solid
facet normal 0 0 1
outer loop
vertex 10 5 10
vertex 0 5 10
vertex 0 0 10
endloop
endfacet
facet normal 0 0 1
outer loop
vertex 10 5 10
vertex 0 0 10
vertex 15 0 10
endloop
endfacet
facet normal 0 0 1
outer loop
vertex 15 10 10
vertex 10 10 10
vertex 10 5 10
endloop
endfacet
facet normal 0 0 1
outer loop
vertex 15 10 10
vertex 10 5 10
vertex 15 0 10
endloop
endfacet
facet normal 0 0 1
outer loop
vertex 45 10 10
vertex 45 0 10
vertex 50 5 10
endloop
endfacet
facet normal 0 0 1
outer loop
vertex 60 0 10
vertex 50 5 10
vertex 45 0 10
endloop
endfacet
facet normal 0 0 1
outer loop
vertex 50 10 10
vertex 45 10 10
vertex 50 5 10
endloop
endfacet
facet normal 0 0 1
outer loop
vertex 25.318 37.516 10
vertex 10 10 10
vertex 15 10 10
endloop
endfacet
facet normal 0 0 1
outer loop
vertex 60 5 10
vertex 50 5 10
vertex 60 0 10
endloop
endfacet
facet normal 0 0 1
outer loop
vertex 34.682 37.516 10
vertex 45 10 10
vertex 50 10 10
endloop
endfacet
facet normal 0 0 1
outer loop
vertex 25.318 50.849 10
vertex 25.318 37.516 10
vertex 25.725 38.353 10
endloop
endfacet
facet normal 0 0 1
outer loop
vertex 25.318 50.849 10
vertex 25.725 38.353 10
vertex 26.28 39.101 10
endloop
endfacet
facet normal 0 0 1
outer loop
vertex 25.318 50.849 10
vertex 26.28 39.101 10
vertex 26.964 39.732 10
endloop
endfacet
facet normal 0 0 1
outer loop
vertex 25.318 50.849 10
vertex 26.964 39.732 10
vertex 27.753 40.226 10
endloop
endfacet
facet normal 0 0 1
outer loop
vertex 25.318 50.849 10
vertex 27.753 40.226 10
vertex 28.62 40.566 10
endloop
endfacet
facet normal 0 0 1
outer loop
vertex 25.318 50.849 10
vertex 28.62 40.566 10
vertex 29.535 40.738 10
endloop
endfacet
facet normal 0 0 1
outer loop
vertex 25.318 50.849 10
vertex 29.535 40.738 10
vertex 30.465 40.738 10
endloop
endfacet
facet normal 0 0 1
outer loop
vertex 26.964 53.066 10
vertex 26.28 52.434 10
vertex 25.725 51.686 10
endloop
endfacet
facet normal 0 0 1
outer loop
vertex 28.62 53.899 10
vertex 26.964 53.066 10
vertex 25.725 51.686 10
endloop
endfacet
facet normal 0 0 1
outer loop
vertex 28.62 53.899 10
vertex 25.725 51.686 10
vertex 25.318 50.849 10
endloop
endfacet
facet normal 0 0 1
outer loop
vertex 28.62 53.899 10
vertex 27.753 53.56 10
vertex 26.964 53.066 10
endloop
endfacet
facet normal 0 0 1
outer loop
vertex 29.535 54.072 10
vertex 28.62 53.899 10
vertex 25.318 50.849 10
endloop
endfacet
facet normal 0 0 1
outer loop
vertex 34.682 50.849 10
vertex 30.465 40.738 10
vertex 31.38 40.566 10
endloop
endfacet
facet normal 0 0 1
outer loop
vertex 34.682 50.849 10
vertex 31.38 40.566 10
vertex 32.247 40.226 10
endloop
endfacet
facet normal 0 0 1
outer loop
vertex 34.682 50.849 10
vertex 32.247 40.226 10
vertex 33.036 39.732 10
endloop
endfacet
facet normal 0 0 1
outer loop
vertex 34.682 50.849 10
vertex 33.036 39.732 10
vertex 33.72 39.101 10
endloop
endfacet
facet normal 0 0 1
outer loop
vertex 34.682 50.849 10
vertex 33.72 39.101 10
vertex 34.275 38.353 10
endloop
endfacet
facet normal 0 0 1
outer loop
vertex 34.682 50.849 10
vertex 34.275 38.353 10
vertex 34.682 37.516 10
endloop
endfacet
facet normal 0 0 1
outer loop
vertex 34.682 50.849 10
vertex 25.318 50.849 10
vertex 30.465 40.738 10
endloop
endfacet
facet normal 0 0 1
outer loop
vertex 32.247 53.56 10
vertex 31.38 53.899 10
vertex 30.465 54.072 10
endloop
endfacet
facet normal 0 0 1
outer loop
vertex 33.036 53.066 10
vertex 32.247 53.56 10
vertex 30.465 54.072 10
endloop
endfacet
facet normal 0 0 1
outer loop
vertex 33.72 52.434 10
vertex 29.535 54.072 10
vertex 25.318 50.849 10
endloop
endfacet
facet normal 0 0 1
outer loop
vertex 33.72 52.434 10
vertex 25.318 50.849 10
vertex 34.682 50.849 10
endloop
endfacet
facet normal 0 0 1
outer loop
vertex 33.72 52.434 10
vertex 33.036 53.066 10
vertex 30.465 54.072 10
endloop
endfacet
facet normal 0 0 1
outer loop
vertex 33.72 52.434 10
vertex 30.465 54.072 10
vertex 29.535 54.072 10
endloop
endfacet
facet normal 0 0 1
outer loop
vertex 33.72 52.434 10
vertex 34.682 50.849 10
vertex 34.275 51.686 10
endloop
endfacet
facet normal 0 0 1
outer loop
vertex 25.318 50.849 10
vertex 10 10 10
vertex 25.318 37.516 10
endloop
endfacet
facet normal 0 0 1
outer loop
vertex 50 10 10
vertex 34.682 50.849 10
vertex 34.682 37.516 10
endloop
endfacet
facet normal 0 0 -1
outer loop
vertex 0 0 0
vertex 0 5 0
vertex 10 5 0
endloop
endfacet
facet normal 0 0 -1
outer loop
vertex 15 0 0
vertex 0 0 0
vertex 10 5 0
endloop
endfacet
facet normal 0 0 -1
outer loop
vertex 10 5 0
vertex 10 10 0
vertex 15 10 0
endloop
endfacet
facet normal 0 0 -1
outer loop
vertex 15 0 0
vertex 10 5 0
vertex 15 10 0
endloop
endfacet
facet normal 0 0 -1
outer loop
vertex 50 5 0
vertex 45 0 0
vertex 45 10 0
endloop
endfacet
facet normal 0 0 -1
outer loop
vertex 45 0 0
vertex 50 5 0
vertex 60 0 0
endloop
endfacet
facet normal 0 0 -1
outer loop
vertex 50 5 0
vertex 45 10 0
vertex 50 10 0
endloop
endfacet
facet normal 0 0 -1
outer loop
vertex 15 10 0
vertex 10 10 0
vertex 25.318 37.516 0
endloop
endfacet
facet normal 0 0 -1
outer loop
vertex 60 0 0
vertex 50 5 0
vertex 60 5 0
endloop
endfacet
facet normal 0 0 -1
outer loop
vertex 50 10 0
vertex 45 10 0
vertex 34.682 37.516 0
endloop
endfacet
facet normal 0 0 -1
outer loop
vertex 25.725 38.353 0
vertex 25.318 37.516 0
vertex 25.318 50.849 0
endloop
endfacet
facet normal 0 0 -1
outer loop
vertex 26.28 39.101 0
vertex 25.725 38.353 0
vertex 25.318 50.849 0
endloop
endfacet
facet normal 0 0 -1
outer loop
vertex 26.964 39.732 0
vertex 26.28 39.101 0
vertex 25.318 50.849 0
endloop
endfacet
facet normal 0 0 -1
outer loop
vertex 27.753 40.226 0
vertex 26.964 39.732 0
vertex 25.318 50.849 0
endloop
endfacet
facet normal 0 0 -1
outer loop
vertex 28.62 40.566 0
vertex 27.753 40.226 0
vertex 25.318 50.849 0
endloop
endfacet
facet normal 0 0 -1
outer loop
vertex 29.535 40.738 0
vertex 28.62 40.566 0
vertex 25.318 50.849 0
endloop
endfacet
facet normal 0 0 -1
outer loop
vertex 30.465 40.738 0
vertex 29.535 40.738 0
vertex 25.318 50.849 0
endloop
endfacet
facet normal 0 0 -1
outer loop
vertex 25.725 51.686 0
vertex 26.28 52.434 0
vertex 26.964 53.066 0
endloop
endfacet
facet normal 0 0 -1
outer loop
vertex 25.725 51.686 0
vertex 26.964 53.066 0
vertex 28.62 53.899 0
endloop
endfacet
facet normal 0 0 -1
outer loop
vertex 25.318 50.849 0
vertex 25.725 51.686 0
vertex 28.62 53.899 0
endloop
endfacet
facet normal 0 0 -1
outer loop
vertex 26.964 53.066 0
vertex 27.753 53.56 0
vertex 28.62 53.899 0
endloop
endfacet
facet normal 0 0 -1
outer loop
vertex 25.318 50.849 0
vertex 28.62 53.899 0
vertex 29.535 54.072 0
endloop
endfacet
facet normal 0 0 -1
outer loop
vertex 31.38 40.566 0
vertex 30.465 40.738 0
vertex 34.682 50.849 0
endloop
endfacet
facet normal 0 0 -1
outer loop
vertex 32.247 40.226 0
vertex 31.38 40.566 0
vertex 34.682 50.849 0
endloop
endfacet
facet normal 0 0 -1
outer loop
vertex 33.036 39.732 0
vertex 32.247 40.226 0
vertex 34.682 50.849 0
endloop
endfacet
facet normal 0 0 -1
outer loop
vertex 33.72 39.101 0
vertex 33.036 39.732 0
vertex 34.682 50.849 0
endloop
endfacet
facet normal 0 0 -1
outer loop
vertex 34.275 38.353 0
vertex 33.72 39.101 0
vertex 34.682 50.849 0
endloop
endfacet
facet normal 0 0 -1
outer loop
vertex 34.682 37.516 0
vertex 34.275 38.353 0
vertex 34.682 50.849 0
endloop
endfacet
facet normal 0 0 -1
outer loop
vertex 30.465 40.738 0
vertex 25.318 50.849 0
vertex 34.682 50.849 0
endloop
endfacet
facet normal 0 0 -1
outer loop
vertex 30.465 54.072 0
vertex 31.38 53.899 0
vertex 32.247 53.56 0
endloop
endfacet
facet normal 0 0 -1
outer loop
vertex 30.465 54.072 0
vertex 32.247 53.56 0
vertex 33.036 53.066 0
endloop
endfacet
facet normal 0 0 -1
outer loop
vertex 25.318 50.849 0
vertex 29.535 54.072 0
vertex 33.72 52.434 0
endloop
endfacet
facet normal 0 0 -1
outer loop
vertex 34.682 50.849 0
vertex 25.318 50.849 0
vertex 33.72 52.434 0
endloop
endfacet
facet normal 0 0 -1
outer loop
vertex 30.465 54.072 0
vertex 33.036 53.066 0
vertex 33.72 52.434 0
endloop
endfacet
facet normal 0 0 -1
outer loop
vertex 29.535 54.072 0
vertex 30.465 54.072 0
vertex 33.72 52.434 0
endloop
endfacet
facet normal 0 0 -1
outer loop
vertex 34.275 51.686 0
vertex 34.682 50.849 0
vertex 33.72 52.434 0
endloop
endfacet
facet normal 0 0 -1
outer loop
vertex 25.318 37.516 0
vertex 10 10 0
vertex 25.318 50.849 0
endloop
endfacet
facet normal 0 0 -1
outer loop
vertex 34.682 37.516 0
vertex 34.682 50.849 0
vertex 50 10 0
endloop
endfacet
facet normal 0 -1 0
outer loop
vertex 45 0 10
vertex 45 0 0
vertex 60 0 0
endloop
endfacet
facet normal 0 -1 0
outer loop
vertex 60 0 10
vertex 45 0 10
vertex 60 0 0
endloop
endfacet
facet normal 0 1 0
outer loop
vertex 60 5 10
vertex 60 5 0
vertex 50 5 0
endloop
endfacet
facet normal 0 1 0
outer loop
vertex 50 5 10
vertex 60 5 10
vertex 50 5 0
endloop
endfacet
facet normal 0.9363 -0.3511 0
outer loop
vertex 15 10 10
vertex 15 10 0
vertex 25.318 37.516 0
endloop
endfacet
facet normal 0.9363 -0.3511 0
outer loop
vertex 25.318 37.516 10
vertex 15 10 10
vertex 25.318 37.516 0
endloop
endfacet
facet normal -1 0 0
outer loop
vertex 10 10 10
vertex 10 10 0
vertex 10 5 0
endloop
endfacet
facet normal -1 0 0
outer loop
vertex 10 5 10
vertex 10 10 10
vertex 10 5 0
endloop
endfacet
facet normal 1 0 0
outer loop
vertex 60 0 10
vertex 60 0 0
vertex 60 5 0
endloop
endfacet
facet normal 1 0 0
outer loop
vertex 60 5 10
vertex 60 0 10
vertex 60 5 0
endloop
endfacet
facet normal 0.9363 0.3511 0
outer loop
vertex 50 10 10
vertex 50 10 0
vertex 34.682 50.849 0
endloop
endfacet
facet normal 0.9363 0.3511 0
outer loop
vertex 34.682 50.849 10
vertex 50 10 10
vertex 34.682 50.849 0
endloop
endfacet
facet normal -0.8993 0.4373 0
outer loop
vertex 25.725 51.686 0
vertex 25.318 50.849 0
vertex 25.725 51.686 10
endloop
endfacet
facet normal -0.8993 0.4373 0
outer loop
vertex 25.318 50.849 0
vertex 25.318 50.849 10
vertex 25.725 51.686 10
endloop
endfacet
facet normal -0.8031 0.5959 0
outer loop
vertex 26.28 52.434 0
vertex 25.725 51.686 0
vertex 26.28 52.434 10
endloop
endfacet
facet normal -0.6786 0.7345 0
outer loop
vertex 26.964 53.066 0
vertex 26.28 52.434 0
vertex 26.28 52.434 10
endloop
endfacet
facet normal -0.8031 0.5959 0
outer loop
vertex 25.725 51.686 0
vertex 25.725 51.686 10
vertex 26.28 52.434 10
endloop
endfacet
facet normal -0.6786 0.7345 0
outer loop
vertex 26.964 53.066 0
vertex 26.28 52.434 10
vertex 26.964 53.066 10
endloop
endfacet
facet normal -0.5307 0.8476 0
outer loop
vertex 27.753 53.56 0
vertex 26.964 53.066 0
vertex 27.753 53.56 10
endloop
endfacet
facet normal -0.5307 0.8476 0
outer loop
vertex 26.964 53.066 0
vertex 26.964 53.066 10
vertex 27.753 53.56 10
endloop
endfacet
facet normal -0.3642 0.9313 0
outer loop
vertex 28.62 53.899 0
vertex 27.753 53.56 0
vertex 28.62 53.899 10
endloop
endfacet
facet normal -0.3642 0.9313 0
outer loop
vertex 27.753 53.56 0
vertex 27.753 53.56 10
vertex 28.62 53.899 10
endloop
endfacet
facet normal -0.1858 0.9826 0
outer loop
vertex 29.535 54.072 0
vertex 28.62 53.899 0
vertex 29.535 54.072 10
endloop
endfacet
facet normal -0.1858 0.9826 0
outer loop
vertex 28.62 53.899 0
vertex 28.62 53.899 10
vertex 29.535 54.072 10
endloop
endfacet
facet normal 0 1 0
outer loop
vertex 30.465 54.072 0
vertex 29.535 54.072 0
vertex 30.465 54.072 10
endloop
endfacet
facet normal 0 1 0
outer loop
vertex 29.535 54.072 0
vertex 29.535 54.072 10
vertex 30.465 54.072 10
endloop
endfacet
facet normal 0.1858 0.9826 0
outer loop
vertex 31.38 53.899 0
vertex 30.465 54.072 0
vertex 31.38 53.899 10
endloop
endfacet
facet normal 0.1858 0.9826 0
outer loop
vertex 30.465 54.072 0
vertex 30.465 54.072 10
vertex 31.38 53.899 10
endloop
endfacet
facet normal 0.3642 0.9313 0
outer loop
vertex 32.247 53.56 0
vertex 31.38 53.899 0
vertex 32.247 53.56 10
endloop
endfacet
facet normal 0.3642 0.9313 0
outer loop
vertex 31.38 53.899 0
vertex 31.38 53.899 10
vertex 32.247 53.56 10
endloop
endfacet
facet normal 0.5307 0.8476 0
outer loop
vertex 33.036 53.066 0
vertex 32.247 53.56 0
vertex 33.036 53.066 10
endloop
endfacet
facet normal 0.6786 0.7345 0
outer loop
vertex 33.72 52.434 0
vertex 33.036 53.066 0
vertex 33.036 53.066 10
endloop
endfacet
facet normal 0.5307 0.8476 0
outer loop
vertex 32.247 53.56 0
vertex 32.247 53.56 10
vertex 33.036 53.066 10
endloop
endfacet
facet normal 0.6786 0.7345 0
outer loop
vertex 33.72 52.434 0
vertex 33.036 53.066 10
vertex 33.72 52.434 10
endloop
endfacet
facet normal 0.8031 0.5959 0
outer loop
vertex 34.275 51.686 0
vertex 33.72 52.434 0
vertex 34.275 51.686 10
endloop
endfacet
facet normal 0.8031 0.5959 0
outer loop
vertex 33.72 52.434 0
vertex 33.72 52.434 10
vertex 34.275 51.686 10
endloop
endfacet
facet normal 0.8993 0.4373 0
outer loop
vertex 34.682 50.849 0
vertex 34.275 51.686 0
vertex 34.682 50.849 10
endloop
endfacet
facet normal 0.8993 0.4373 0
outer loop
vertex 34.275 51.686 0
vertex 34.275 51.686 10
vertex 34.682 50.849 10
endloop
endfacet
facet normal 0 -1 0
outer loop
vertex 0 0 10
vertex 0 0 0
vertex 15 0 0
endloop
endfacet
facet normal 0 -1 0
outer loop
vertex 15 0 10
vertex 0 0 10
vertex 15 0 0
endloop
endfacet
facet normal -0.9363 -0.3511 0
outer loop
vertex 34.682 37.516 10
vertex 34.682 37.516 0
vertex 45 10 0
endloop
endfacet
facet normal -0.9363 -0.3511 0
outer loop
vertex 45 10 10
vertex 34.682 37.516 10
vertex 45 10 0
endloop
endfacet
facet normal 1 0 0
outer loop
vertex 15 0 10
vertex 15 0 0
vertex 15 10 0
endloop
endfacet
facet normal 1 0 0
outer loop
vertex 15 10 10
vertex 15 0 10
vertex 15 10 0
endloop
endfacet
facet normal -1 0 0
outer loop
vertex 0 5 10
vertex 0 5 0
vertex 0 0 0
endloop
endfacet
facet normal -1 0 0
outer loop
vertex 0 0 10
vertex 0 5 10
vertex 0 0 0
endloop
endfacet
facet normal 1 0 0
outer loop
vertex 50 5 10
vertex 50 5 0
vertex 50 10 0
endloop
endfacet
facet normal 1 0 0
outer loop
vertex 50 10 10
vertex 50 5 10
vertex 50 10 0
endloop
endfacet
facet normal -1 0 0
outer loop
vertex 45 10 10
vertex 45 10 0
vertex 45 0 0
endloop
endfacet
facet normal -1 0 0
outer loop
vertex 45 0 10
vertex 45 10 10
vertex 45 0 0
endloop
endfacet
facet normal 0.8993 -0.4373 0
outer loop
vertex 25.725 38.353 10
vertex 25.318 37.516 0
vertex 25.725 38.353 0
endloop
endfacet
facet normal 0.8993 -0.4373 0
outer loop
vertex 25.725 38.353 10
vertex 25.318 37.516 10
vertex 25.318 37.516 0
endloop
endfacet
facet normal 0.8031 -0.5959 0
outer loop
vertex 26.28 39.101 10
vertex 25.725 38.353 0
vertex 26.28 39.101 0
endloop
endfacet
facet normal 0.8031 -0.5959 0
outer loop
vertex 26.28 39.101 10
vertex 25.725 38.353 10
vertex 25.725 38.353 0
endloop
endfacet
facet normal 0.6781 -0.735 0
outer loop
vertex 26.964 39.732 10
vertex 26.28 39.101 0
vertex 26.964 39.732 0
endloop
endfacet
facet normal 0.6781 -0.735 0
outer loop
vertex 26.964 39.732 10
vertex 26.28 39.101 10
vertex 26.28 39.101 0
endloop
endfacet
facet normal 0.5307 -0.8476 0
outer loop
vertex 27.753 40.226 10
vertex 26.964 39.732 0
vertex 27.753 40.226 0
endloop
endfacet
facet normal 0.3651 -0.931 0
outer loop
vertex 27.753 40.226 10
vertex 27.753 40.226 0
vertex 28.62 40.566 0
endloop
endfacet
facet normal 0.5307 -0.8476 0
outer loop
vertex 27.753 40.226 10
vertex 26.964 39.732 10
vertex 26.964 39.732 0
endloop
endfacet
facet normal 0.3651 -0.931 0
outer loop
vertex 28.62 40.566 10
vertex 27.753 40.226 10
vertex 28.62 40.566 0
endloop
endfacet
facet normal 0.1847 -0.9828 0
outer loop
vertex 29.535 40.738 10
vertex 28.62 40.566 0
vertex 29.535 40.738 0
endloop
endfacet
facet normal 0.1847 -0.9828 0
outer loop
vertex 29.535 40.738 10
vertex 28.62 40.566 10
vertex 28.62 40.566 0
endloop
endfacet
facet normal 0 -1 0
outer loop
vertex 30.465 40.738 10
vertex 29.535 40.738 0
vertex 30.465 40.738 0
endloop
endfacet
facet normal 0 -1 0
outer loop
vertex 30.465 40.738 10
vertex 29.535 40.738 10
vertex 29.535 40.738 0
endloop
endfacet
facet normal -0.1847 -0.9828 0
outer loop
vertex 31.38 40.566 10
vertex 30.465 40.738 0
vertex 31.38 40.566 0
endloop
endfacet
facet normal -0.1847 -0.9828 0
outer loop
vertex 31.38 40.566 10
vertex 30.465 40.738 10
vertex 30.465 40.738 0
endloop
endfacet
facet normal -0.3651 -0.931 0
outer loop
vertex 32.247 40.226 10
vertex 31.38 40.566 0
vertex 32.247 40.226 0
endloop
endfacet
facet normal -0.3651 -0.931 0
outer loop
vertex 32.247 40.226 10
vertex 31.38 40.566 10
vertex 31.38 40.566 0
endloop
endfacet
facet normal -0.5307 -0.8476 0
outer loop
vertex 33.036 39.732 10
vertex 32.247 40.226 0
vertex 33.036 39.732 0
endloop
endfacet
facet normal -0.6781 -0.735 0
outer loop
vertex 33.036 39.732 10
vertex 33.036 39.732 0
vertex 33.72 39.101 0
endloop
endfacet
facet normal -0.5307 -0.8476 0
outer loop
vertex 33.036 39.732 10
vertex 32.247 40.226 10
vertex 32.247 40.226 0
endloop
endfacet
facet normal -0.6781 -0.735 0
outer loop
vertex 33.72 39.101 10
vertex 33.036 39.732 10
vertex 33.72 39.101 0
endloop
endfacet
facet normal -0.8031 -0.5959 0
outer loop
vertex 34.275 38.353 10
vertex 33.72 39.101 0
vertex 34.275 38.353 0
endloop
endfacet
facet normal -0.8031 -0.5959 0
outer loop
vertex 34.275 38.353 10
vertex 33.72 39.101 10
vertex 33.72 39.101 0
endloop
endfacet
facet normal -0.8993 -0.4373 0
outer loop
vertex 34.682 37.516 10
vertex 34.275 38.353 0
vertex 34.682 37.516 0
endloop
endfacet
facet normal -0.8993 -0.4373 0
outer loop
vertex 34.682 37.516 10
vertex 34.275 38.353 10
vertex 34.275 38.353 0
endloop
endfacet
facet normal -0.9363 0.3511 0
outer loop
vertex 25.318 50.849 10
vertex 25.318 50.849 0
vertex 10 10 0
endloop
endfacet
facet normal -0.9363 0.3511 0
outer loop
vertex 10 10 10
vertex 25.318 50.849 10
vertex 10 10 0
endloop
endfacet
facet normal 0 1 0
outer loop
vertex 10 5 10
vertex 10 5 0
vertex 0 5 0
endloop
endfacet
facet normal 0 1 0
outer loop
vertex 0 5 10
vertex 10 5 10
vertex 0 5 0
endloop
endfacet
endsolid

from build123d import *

# Parameters (mm, degrees)
BOSS_EXTRUDE1_DEPTH = 10
FILLET1_R           = 5
FILLET2_R           = 5


with BuildPart() as part:
    # Sketch1 → Boss-Extrude1 (new body)
    with BuildSketch(Plane.XY):
        Polygon((0, 0), (15, 0), (15, 10), (30, 50), (45, 10), (45, 0), (60, 0), (60, 5), (50, 5), (50, 10), (30, 63.333333333), (10, 10), (10, 5), (0, 5), align=None)
    extrude(amount=BOSS_EXTRUDE1_DEPTH)

    # Fillet1
    fillet1_edges = [part.edges().sort_by_distance(p)[0] for p in [
        (30, 50, 5),
    ]]
    fillet(fillet1_edges, radius=FILLET1_R)

    # Fillet2
    fillet2_edges = [part.edges().sort_by_distance(p)[0] for p in [
        (30, 63.333333333, 5),
    ]]
    fillet(fillet2_edges, radius=FILLET2_R)


solid = part.part
